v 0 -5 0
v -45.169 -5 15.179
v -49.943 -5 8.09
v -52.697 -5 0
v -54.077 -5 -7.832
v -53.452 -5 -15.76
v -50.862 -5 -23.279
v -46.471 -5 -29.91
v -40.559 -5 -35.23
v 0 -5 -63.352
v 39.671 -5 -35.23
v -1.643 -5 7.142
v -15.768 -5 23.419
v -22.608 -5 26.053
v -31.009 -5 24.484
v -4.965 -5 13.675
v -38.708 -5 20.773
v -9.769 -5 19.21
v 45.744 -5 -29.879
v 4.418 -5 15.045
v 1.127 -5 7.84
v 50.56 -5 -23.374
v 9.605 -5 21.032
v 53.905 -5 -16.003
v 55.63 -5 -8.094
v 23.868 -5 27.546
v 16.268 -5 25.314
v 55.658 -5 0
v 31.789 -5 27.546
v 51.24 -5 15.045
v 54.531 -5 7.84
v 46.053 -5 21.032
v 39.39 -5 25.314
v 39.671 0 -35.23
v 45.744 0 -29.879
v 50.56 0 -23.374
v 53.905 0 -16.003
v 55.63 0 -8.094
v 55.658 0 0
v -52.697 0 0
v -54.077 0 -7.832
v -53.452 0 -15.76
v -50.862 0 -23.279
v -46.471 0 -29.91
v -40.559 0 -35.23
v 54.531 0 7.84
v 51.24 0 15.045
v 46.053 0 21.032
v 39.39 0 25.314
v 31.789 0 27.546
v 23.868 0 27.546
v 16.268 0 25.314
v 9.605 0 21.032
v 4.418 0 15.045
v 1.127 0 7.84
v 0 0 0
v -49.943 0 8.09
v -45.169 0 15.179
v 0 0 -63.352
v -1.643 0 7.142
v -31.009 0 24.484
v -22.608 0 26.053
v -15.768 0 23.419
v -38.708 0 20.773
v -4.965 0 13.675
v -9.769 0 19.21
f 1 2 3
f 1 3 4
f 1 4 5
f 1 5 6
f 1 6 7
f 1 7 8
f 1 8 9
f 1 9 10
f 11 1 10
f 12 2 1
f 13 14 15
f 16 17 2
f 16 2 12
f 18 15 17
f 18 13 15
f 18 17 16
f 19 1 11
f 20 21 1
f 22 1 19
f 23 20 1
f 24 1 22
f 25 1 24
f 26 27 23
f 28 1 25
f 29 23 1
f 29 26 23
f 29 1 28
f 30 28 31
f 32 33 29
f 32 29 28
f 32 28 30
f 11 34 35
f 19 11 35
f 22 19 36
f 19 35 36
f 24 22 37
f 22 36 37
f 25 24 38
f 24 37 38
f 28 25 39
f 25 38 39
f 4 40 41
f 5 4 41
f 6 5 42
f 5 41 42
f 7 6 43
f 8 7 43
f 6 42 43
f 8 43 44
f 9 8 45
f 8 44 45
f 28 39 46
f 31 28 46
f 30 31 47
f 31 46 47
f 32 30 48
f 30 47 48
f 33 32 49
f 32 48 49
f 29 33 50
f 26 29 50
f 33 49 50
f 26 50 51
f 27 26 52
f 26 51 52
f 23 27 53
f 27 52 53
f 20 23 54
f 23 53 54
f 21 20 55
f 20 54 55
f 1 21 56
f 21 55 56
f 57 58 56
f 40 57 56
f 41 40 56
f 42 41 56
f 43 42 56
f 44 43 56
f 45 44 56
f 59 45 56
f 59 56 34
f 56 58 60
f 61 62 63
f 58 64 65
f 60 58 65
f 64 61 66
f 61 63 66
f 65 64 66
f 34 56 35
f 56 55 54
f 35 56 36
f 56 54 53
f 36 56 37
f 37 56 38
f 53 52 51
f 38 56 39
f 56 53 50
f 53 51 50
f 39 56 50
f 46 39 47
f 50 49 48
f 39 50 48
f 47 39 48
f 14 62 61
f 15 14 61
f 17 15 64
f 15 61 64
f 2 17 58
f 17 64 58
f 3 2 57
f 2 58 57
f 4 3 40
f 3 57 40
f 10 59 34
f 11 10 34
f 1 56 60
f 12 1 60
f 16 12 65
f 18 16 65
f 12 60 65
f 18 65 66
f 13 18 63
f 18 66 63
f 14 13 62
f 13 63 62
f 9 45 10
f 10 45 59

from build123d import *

# Parameters (mm, degrees)
F1_DEPTH = 5


with BuildPart() as f1:
    # F0 (on Front) → F1 (new body)
    with BuildSketch(Plane.XZ):
        with BuildLine():
            ThreePointArc((39.671052, -35.230264), (52.427442, -19.776479), (55.657893, 0))
            ThreePointArc((55.657893, 0), (27.828947, 27.828947), (0, 0))
            ThreePointArc((0, 0), (-7.19782, 16.589503), (-22.607862, 26.052631))
            ThreePointArc((-22.607862, 26.052631), (-42.123539, 18.190011), (-52.697372, 0))
            ThreePointArc((-52.697372, 0), (-52.395006, -19.601983), (-40.559214, -35.230264))
            Line((-40.559214, -35.230264), (0, -63.351638))
            Line((0, -63.351638), (39.671052, -35.230264))
        make_face()
    extrude(amount=F1_DEPTH)


solid = f1.part
